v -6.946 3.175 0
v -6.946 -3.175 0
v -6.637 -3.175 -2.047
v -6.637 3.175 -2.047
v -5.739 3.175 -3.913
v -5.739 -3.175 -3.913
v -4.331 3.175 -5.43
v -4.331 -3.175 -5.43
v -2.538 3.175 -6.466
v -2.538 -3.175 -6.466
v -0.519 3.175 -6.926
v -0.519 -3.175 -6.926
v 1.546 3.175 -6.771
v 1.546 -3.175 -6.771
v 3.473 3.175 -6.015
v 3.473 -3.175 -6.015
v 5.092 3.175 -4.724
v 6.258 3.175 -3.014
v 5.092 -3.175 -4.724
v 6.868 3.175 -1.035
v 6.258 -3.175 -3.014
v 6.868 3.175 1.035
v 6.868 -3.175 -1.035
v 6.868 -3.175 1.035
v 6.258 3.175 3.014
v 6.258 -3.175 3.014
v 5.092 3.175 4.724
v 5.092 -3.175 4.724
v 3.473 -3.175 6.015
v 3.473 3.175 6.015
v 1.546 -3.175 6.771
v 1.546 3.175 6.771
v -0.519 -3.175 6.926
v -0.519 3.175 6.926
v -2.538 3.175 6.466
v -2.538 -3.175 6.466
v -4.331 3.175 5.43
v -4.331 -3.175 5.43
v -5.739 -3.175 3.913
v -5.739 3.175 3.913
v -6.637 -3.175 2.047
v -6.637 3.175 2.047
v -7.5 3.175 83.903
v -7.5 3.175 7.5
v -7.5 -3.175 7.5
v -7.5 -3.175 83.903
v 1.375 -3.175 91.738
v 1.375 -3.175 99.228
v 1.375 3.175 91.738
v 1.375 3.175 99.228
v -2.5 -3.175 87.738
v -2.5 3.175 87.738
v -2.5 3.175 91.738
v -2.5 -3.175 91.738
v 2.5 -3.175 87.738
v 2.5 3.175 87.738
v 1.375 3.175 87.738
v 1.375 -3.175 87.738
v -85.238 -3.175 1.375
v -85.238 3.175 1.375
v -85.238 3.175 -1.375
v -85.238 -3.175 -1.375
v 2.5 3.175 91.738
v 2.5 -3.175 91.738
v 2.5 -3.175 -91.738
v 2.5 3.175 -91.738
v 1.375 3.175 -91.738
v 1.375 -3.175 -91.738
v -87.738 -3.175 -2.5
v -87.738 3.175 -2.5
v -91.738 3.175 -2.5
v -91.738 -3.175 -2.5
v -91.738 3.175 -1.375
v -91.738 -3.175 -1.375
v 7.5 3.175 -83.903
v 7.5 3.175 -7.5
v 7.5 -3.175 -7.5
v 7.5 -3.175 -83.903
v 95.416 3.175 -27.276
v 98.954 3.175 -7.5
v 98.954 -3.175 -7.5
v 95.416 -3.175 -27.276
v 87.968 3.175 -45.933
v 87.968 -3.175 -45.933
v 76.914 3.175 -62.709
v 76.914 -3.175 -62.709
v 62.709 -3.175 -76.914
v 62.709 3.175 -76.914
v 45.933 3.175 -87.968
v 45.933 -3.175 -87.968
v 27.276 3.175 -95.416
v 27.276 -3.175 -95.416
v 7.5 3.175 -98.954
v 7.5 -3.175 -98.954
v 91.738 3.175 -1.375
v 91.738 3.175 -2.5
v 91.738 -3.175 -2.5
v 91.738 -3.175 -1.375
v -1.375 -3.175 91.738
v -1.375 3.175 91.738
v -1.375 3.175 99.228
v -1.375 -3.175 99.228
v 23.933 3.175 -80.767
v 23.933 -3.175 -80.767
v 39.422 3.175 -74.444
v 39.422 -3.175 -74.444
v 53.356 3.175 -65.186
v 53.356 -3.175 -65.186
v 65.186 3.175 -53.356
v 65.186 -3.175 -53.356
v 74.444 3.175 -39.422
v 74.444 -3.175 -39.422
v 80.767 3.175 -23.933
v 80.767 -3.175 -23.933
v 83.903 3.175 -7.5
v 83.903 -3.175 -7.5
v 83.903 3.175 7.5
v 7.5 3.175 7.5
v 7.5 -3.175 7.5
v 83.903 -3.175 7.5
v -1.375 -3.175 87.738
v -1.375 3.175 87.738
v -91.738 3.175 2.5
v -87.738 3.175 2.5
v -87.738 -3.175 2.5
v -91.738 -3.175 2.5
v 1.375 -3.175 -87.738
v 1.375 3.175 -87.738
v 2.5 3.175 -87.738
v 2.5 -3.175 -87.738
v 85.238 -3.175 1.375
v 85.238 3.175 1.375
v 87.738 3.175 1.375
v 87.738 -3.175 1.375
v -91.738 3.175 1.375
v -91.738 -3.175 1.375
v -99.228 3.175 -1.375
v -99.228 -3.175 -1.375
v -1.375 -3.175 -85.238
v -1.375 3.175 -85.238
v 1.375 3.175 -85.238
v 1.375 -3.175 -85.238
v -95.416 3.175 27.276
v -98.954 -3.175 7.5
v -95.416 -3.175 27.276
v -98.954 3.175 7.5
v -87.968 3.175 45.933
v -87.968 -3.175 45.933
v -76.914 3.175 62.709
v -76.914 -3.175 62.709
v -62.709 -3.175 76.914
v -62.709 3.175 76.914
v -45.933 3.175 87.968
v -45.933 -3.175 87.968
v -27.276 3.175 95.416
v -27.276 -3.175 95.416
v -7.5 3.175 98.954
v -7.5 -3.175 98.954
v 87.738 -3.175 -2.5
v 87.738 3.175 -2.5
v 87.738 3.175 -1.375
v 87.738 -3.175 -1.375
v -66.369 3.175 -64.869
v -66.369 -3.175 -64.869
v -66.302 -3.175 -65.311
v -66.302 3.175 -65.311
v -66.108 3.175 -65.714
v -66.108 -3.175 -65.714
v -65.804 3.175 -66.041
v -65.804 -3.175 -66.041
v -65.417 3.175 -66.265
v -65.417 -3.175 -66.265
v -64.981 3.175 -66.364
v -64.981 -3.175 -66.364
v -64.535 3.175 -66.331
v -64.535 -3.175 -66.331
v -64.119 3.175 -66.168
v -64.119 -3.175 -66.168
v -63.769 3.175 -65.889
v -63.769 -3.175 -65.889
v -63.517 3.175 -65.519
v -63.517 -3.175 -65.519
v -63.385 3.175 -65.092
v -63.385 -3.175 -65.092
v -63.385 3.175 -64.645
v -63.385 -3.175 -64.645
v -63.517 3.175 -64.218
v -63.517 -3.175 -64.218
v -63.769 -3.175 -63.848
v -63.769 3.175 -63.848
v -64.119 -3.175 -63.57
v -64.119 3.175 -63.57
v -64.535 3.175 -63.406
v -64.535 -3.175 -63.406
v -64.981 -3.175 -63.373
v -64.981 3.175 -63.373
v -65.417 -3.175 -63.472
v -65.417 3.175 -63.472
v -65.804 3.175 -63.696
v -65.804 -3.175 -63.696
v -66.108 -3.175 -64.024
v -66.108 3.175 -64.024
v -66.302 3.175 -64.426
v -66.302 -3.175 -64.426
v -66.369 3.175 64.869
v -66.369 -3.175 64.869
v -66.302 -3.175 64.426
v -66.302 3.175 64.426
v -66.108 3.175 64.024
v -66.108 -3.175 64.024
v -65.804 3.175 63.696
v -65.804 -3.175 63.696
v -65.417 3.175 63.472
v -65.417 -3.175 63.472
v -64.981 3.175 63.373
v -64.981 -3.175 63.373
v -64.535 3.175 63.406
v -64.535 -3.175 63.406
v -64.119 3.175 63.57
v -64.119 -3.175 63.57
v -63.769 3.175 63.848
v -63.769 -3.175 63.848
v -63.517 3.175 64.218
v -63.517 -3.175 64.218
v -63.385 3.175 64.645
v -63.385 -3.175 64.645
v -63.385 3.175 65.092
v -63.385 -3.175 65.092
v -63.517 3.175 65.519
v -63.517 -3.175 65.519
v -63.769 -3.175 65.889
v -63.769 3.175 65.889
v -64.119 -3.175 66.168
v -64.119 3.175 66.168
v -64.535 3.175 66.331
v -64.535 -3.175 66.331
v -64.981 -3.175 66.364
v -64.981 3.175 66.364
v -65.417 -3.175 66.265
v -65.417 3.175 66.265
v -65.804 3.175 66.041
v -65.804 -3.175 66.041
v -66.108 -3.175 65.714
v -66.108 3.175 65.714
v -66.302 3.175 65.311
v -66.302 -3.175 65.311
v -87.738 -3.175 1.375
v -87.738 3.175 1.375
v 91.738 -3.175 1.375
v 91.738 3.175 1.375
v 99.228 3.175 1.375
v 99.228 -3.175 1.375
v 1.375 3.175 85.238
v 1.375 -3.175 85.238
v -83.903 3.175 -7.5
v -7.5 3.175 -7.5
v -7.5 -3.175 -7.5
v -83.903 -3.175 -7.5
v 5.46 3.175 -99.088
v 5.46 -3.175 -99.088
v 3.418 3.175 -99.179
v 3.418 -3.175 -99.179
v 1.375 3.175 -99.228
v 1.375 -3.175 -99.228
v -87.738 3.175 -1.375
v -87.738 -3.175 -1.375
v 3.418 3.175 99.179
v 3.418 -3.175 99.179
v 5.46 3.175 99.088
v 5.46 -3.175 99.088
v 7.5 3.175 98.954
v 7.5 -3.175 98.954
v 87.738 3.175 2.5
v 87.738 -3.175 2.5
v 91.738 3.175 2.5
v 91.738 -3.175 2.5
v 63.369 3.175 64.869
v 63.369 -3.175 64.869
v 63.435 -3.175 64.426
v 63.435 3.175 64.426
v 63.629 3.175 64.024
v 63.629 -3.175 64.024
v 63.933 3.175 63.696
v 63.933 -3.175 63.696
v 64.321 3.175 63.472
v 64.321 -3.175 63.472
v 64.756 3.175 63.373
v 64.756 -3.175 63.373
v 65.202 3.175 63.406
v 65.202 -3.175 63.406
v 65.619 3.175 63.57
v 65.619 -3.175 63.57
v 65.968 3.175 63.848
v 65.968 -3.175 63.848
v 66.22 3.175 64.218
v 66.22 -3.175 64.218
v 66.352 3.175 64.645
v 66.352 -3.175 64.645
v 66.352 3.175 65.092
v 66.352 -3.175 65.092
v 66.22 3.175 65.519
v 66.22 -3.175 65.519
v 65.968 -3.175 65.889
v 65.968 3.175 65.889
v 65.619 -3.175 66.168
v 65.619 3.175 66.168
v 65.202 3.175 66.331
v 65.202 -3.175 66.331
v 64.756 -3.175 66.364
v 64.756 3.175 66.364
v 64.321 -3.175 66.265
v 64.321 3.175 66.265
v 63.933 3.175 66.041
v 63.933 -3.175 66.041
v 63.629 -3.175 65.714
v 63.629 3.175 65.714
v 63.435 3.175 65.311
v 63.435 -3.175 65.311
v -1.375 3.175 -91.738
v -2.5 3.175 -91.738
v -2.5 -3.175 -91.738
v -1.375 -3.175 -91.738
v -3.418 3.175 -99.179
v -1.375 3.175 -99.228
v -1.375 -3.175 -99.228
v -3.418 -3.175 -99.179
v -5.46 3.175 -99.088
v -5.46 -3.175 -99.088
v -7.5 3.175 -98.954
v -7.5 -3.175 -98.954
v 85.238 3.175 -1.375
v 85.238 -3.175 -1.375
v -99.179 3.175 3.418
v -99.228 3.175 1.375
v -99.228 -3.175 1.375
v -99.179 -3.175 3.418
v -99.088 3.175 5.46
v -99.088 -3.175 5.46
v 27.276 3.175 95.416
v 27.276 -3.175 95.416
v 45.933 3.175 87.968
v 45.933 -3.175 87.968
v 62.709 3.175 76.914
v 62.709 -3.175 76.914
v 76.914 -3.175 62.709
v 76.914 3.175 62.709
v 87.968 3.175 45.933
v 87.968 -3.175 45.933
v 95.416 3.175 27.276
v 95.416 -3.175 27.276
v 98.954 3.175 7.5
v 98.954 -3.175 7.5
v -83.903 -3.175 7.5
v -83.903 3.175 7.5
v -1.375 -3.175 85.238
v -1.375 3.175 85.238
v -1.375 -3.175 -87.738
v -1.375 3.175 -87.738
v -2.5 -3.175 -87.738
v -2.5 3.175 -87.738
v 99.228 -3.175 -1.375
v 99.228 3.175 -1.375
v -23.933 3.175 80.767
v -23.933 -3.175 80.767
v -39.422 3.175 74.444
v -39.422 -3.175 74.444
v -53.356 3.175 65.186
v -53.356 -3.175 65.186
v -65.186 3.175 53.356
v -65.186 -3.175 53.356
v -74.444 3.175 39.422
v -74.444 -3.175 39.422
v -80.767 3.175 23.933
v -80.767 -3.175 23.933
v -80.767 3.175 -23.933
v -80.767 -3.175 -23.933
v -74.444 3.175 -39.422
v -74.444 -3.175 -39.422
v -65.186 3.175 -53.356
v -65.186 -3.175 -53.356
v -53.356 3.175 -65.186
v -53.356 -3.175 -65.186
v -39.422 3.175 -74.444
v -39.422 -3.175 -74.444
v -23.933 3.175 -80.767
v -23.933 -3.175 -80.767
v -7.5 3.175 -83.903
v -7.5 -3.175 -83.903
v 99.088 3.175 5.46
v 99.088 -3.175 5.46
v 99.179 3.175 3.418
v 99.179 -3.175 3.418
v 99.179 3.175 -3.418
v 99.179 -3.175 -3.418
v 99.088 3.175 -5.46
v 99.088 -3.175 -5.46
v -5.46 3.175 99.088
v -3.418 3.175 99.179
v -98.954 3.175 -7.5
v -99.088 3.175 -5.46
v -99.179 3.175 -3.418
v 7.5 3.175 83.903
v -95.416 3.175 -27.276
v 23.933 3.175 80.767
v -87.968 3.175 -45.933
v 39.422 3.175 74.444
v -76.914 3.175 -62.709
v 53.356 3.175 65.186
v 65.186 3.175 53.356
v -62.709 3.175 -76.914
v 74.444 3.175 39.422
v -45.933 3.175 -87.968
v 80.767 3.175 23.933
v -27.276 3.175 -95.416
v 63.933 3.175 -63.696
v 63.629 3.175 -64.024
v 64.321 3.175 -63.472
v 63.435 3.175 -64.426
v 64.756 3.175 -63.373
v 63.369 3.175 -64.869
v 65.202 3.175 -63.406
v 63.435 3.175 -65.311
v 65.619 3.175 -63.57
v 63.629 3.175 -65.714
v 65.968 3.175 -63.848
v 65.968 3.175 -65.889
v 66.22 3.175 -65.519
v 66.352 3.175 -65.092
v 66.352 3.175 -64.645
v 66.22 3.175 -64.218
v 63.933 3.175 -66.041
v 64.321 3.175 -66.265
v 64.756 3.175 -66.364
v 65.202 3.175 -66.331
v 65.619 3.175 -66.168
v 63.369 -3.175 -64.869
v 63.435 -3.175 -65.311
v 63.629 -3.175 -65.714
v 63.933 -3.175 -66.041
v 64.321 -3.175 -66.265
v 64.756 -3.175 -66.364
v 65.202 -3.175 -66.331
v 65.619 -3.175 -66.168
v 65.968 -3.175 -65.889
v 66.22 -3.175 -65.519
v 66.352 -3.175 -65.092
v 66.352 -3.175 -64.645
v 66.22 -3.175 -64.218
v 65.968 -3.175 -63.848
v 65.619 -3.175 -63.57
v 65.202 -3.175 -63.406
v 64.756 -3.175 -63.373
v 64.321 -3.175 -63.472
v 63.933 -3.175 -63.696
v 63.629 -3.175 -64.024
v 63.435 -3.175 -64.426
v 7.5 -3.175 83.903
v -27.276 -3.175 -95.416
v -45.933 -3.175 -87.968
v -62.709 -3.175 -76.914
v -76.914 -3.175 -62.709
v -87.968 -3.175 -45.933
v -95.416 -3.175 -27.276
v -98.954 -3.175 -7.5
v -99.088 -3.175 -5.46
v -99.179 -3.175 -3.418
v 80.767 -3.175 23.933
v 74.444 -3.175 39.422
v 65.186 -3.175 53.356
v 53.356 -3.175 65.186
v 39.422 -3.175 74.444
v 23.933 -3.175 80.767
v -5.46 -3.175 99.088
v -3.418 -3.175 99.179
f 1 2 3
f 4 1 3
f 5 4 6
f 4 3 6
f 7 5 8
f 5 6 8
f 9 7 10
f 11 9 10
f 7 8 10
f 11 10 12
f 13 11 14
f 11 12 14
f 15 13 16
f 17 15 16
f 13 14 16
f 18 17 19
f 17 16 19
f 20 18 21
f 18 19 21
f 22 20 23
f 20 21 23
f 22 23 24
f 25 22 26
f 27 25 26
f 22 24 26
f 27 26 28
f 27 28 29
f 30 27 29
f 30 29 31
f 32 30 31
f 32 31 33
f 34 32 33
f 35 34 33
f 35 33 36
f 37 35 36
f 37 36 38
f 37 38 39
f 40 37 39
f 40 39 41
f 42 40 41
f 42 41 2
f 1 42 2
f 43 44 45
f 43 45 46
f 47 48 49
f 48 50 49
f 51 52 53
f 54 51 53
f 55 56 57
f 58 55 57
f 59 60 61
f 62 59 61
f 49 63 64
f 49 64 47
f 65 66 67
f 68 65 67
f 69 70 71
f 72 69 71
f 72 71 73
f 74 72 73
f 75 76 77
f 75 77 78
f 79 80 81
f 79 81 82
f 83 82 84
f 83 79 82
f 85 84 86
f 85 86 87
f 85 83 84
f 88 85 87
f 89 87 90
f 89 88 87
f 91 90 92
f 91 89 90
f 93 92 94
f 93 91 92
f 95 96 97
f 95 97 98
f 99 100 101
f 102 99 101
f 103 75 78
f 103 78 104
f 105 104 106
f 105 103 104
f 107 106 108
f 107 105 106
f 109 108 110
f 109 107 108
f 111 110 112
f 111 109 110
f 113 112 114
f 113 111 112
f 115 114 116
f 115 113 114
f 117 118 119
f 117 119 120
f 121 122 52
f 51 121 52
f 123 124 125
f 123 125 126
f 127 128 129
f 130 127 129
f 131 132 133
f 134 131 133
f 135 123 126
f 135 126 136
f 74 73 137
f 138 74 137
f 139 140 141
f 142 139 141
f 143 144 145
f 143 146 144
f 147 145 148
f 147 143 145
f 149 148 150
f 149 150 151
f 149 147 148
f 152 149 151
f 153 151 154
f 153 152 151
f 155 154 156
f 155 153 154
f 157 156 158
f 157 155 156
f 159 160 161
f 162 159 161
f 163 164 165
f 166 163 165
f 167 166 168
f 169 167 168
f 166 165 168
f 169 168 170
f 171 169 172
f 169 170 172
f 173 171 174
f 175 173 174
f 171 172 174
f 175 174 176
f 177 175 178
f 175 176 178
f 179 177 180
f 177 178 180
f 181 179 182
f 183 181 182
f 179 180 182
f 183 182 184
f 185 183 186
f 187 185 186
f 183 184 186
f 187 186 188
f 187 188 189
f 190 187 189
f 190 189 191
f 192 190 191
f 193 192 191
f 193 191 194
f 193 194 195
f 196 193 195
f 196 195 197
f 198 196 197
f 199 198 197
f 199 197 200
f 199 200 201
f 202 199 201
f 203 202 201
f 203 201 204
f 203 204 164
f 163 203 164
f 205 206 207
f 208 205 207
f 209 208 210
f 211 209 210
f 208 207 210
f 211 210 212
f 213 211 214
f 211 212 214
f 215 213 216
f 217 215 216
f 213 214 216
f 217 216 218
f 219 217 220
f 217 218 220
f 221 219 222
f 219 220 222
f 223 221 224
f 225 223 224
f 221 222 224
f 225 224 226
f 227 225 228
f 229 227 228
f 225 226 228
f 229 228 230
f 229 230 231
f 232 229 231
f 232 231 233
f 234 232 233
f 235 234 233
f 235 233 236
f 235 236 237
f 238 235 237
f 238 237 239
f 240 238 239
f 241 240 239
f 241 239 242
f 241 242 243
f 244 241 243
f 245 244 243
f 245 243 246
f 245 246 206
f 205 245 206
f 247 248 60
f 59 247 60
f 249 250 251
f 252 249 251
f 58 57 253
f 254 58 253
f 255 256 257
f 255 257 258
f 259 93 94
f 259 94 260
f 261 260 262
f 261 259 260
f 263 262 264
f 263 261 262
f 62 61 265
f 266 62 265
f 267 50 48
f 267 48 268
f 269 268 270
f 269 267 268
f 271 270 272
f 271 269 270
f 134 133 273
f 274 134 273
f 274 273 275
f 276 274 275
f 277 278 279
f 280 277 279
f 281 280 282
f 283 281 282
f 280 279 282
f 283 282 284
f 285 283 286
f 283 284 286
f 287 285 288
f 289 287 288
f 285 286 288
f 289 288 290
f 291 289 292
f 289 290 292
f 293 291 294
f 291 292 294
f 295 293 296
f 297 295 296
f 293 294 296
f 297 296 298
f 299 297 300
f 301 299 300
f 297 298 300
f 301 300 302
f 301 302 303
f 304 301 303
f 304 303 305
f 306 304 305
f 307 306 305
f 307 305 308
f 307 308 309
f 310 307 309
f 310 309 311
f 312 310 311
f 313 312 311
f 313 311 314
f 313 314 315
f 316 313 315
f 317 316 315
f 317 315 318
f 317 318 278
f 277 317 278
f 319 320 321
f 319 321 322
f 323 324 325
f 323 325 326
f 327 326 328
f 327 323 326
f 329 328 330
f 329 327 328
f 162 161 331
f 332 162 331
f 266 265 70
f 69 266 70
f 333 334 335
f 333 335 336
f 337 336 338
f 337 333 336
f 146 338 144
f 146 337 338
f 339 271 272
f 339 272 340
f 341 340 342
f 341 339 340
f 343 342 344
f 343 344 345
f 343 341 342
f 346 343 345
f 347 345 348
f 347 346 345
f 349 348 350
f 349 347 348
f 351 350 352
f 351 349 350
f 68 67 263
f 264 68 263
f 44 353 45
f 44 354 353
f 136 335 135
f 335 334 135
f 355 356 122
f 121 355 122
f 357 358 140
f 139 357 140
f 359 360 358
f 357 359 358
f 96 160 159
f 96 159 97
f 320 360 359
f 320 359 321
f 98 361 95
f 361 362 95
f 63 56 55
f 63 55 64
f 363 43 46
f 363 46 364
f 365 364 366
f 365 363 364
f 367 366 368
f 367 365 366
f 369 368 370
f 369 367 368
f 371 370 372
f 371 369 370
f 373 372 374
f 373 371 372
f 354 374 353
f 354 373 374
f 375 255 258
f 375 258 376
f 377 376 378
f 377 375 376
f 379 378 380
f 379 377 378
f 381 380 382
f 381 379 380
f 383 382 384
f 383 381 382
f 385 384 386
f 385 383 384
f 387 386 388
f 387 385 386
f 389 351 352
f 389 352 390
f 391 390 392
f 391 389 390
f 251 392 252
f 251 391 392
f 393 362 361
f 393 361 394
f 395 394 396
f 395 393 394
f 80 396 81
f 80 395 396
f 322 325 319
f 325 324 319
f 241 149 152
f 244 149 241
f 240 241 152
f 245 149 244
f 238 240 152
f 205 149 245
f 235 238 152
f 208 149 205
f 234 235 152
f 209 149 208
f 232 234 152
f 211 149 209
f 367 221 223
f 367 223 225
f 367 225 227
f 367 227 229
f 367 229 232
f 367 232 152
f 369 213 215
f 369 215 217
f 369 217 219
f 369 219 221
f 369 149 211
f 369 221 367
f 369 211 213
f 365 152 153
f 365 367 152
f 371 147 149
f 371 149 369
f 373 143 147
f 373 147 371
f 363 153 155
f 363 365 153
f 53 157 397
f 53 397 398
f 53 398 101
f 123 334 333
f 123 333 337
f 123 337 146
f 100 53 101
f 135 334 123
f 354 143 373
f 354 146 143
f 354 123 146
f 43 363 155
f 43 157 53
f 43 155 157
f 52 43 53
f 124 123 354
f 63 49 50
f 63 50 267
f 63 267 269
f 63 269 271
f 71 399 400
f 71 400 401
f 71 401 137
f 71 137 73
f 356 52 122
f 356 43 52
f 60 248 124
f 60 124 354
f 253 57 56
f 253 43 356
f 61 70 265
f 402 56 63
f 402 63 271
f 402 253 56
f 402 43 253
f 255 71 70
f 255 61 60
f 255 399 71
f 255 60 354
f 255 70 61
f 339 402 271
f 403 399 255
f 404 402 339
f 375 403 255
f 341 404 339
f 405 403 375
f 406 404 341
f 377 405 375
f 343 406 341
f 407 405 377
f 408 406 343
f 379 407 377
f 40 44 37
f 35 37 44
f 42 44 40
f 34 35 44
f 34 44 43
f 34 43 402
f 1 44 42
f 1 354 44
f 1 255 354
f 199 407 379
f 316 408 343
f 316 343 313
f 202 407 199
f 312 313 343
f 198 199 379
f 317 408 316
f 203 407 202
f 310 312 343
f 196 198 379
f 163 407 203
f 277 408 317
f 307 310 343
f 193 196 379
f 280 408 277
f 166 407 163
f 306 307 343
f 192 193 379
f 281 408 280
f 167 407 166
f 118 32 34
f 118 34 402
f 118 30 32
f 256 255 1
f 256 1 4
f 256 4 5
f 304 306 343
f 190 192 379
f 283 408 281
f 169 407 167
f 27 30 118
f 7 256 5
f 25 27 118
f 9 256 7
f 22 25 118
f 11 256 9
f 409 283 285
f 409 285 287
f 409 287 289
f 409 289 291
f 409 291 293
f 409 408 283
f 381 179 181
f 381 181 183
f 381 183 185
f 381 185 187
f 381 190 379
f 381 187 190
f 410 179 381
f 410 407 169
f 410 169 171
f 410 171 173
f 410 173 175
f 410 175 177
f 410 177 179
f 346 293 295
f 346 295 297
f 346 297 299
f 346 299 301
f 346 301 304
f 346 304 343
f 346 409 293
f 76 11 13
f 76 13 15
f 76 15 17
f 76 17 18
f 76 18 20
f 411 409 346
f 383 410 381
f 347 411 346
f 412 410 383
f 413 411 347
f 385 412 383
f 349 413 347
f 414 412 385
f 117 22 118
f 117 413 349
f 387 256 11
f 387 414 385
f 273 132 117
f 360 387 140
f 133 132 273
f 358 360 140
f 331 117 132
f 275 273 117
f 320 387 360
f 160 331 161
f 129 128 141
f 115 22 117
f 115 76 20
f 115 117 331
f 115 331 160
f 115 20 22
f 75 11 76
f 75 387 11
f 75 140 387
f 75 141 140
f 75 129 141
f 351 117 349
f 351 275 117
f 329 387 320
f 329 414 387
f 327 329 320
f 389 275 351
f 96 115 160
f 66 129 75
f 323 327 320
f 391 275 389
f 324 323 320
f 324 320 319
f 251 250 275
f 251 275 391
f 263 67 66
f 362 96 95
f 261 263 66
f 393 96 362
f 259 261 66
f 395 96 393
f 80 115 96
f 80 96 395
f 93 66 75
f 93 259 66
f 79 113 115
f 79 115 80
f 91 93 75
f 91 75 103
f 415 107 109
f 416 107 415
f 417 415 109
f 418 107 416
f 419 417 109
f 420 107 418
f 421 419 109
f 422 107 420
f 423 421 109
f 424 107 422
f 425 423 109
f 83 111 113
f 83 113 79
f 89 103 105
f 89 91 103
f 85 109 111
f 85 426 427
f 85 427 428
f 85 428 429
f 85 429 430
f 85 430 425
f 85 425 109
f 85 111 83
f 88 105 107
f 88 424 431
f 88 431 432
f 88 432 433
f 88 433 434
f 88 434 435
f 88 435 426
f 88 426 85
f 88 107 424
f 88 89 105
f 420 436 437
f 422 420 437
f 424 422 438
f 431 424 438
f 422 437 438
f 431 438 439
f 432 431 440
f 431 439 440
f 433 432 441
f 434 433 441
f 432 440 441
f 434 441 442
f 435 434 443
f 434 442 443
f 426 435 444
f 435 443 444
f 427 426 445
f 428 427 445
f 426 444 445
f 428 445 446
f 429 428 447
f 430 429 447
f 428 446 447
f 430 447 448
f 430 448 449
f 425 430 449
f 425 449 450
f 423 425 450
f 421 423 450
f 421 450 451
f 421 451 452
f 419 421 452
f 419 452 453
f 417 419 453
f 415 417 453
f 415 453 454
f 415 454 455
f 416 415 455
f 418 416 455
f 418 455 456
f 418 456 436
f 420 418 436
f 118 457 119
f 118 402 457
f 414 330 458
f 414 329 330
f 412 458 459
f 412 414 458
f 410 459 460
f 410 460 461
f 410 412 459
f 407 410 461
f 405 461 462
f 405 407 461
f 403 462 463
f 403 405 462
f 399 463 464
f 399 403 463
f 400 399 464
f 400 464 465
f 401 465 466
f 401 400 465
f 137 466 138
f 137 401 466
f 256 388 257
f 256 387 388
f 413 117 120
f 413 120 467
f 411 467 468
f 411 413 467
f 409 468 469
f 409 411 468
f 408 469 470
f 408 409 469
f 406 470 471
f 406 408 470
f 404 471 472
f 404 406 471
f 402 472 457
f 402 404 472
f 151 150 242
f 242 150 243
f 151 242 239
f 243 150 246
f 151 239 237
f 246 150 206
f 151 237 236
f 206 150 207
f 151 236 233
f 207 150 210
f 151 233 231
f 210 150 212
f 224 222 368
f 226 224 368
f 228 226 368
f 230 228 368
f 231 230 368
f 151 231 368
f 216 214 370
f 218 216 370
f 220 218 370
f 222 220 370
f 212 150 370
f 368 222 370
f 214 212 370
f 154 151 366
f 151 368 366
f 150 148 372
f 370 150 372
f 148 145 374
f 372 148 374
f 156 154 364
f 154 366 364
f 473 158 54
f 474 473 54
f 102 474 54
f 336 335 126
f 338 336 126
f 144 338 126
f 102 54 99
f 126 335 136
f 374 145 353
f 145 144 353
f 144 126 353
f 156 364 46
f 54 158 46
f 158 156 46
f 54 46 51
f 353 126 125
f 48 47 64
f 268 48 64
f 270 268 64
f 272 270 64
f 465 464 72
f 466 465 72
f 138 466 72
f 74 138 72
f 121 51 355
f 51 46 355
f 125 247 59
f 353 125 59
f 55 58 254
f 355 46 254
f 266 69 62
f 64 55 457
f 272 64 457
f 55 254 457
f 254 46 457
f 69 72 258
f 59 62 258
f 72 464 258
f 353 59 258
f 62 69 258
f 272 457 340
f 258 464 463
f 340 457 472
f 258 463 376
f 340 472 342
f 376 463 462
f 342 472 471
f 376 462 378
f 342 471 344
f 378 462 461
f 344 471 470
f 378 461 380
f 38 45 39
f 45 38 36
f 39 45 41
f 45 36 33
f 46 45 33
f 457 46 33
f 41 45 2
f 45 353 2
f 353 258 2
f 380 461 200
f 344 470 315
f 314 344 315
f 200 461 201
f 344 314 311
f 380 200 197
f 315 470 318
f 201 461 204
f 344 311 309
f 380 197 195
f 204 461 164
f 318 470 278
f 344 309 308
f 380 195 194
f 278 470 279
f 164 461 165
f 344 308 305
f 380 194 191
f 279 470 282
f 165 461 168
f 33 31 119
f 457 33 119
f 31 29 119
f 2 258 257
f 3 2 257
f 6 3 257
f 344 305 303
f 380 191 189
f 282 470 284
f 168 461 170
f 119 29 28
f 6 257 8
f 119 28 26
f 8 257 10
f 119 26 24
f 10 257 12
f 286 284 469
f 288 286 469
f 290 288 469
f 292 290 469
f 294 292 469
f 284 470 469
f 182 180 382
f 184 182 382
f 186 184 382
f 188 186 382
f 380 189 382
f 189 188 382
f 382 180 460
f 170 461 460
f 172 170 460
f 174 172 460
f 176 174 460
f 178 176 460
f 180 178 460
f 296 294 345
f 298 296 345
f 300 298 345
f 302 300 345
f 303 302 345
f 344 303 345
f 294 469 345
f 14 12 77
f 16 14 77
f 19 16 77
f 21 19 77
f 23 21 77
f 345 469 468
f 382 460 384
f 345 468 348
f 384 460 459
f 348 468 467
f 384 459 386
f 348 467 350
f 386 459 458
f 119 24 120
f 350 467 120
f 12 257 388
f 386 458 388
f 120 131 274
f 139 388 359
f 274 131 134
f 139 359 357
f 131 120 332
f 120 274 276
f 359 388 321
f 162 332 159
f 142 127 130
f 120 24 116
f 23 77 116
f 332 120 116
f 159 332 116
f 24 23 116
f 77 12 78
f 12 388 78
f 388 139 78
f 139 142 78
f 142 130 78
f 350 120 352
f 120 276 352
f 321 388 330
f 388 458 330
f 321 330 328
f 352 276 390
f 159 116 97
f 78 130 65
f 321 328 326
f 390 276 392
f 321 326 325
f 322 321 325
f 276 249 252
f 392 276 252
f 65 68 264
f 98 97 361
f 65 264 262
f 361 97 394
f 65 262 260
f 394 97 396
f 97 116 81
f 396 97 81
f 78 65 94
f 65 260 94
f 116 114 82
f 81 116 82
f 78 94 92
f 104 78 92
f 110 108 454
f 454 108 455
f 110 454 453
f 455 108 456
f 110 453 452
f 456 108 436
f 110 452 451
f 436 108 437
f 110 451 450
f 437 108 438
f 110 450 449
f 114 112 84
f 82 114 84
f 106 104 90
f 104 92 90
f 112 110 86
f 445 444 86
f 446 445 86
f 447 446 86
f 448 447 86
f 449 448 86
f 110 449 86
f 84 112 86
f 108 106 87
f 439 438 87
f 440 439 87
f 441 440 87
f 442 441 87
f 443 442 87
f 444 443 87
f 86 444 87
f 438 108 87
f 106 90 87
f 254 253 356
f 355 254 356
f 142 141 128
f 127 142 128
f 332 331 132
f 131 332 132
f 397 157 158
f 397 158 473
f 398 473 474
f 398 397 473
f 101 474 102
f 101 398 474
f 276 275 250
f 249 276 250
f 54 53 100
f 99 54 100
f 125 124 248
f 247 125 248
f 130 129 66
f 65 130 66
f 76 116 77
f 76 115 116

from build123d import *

# Parameters (mm, degrees)
SKETCH1_W                   = 15
SKETCH1_H                   = 15
BOSS_EXTRUDE1_DEPTH         = 3.175
SKETCH2_W                   = 2.75
SKETCH2_H                   = 2.5
SKETCH2_H_2                 = 4
SKETCH2_W_2                 = 1.125
SKETCH2_H_3                 = 7.5
CUT_EXTRUDE1_DEPTH          = 141.379634965
CIRPATTERN1_COUNT           = 4
F_3_0_3_DIAMETER_HOLE1_D    = 3
F_1_2_CLEARANCE_HOLE1_D     = 13.89126
F_1_2_CLEARANCE_HOLE1_DEPTH = 6.35


with BuildPart() as part:
    # Sketch1 → Boss-Extrude1 (new, symmetric)
    with BuildSketch(Plane(origin=(0, 0, 0), x_dir=(1, 0, 0), z_dir=(0, 1, 0))):
        with BuildLine():
            Line((-83.903460262, -7.5), (-98.95418457, -7.5))
            ThreePointArc((-98.95418457, -7.5), (-70.171862751, -70.171862751), (-7.5, -98.95418457))
            Line((-7.5, -98.95418457), (-7.5, -83.903460262))
            ThreePointArc((-7.5, -83.903460262), (-59.565261034, -59.565261034), (-83.903460262, -7.5))
        make_face()
        with BuildLine():
            ThreePointArc((-98.95418457, 7.5), (-99.238, 0), (-98.95418457, -7.5))
            Line((-98.95418457, -7.5), (-83.903460262, -7.5))
            ThreePointArc((-83.903460262, -7.5), (-84.238, 0), (-83.903460262, 7.5))
            Line((-83.903460262, 7.5), (-98.95418457, 7.5))
        make_face()
        with BuildLine():
            Line((83.903460262, -7.5), (98.95418457, -7.5))
            ThreePointArc((98.95418457, -7.5), (99.167020759, -3.752684079), (99.238, 0))
            ThreePointArc((99.238, 0), (99.167020759, 3.752684079), (98.95418457, 7.5))
            Line((98.95418457, 7.5), (83.903460262, 7.5))
            ThreePointArc((83.903460262, 7.5), (84.154323506, 3.753728707), (84.238, 0))
            ThreePointArc((84.238, 0), (84.154323506, -3.753728707), (83.903460262, -7.5))
        make_face()
        with BuildLine():
            ThreePointArc((-7.5, 98.95418457), (-70.171862751, 70.171862751), (-98.95418457, 7.5))
            Line((-98.95418457, 7.5), (-83.903460262, 7.5))
            ThreePointArc((-83.903460262, 7.5), (-59.565261034, 59.565261034), (-7.5, 83.903460262))
            Line((-7.5, 83.903460262), (-7.5, 98.95418457))
        make_face()
        with BuildLine():
            Line((-7.5, -83.903460262), (-7.5, -98.95418457))
            ThreePointArc((-7.5, -98.95418457), (0, -99.238), (7.5, -98.95418457))
            Line((7.5, -98.95418457), (7.5, -83.903460262))
            ThreePointArc((7.5, -83.903460262), (0, -84.238), (-7.5, -83.903460262))
        make_face()
        with BuildLine():
            ThreePointArc((7.5, 98.95418457), (0, 99.238), (-7.5, 98.95418457))
            Line((-7.5, 98.95418457), (-7.5, 83.903460262))
            ThreePointArc((-7.5, 83.903460262), (0, 84.238), (7.5, 83.903460262))
            Line((7.5, 83.903460262), (7.5, 98.95418457))
        make_face()
        with BuildLine():
            ThreePointArc((98.95418457, 7.5), (70.171862751, 70.171862751), (7.5, 98.95418457))
            Line((7.5, 98.95418457), (7.5, 83.903460262))
            ThreePointArc((7.5, 83.903460262), (59.565261034, 59.565261034), (83.903460262, 7.5))
            Line((83.903460262, 7.5), (98.95418457, 7.5))
        make_face()
        with BuildLine():
            Line((7.5, -83.903460262), (7.5, -98.95418457))
            ThreePointArc((7.5, -98.95418457), (70.171862751, -70.171862751), (98.95418457, -7.5))
            Line((98.95418457, -7.5), (83.903460262, -7.5))
            ThreePointArc((83.903460262, -7.5), (59.565261034, -59.565261034), (7.5, -83.903460262))
        make_face()
        with BuildLine():
            Line((7.5, -7.5), (-7.5, -7.5))
            Line((-7.5, -7.5), (-7.5, -83.903460262))
            ThreePointArc((-7.5, -83.903460262), (0, -84.238), (7.5, -83.903460262))
            Line((7.5, -83.903460262), (7.5, -7.5))
        make_face()
        with BuildLine():
            ThreePointArc((-83.903460262, 7.5), (-84.238, 0), (-83.903460262, -7.5))
            Line((-83.903460262, -7.5), (-7.5, -7.5))
            Line((-7.5, -7.5), (-7.5, 7.5))
            Line((-7.5, 7.5), (-83.903460262, 7.5))
        make_face()
        with BuildLine():
            Line((-7.5, 83.903460262), (-7.5, 7.5))
            Line((-7.5, 7.5), (7.5, 7.5))
            Line((7.5, 7.5), (7.5, 83.903460262))
            ThreePointArc((7.5, 83.903460262), (0, 84.238), (-7.5, 83.903460262))
        make_face()
        with BuildLine():
            Line((7.5, 7.5), (7.5, -7.5))
            Line((7.5, -7.5), (83.903460262, -7.5))
            ThreePointArc((83.903460262, -7.5), (84.154323506, -3.753728707), (84.238, 0))
            ThreePointArc((84.238, 0), (84.154323506, 3.753728707), (83.903460262, 7.5))
            Line((83.903460262, 7.5), (7.5, 7.5))
        make_face()
        Rectangle(SKETCH1_W, SKETCH1_H)
    extrude(amount=BOSS_EXTRUDE1_DEPTH, both=True)

    # Sketch2 → Cut-Extrude1 (cut, symmetric)
    with BuildSketch(Plane(origin=(0, 0, 0), x_dir=(1, 0, 0), z_dir=(0, 1, 0))):
        with Locations((0, 86.488)):
            Rectangle(SKETCH2_W, SKETCH2_H)
        with Locations((0, 89.738)):
            Rectangle(SKETCH2_W, SKETCH2_H_2)
        with Locations((1.9375, 89.738)):
            Rectangle(SKETCH2_W_2, SKETCH2_H_2)
        with Locations((0, 95.488)):
            Rectangle(SKETCH2_W, SKETCH2_H_3)
        with Locations((-1.9375, 89.738)):
            Rectangle(SKETCH2_W_2, SKETCH2_H_2)
    cut_extrude1 = extrude(amount=CUT_EXTRUDE1_DEPTH, both=True, mode=Mode.SUBTRACT)

    # CirPattern1: Cut-Extrude1 ×4 about axis
    cirpattern1_axis = Axis((0, 0, 0), (0, 1, 0))
    for i in range(1, CIRPATTERN1_COUNT):
        add(cut_extrude1.rotate(cirpattern1_axis, i * 360 / CIRPATTERN1_COUNT), mode=Mode.SUBTRACT)

    # Ø3.0 (3) Diameter Hole1 (through all)
    with Locations(Plane(origin=(0, 3.175, 0), x_dir=(1, 0, 0), z_dir=(0, 1, 0))):
        with Locations((-64.868561892, -64.868561892), (0, 0), (-64.868561892, 64.868561892), (64.868561892, 64.868561892), (64.868561892, -64.868561892)):
            Hole(F_3_0_3_DIAMETER_HOLE1_D / 2)

    # 1/2 Clearance Hole1
    with Locations(Plane(origin=(0, 3.175, 0), x_dir=(1, 0, 0), z_dir=(0, 1, 0))):
        with Locations((0, 0)):
            Hole(F_1_2_CLEARANCE_HOLE1_D / 2, depth=F_1_2_CLEARANCE_HOLE1_DEPTH)


solid = part.part
